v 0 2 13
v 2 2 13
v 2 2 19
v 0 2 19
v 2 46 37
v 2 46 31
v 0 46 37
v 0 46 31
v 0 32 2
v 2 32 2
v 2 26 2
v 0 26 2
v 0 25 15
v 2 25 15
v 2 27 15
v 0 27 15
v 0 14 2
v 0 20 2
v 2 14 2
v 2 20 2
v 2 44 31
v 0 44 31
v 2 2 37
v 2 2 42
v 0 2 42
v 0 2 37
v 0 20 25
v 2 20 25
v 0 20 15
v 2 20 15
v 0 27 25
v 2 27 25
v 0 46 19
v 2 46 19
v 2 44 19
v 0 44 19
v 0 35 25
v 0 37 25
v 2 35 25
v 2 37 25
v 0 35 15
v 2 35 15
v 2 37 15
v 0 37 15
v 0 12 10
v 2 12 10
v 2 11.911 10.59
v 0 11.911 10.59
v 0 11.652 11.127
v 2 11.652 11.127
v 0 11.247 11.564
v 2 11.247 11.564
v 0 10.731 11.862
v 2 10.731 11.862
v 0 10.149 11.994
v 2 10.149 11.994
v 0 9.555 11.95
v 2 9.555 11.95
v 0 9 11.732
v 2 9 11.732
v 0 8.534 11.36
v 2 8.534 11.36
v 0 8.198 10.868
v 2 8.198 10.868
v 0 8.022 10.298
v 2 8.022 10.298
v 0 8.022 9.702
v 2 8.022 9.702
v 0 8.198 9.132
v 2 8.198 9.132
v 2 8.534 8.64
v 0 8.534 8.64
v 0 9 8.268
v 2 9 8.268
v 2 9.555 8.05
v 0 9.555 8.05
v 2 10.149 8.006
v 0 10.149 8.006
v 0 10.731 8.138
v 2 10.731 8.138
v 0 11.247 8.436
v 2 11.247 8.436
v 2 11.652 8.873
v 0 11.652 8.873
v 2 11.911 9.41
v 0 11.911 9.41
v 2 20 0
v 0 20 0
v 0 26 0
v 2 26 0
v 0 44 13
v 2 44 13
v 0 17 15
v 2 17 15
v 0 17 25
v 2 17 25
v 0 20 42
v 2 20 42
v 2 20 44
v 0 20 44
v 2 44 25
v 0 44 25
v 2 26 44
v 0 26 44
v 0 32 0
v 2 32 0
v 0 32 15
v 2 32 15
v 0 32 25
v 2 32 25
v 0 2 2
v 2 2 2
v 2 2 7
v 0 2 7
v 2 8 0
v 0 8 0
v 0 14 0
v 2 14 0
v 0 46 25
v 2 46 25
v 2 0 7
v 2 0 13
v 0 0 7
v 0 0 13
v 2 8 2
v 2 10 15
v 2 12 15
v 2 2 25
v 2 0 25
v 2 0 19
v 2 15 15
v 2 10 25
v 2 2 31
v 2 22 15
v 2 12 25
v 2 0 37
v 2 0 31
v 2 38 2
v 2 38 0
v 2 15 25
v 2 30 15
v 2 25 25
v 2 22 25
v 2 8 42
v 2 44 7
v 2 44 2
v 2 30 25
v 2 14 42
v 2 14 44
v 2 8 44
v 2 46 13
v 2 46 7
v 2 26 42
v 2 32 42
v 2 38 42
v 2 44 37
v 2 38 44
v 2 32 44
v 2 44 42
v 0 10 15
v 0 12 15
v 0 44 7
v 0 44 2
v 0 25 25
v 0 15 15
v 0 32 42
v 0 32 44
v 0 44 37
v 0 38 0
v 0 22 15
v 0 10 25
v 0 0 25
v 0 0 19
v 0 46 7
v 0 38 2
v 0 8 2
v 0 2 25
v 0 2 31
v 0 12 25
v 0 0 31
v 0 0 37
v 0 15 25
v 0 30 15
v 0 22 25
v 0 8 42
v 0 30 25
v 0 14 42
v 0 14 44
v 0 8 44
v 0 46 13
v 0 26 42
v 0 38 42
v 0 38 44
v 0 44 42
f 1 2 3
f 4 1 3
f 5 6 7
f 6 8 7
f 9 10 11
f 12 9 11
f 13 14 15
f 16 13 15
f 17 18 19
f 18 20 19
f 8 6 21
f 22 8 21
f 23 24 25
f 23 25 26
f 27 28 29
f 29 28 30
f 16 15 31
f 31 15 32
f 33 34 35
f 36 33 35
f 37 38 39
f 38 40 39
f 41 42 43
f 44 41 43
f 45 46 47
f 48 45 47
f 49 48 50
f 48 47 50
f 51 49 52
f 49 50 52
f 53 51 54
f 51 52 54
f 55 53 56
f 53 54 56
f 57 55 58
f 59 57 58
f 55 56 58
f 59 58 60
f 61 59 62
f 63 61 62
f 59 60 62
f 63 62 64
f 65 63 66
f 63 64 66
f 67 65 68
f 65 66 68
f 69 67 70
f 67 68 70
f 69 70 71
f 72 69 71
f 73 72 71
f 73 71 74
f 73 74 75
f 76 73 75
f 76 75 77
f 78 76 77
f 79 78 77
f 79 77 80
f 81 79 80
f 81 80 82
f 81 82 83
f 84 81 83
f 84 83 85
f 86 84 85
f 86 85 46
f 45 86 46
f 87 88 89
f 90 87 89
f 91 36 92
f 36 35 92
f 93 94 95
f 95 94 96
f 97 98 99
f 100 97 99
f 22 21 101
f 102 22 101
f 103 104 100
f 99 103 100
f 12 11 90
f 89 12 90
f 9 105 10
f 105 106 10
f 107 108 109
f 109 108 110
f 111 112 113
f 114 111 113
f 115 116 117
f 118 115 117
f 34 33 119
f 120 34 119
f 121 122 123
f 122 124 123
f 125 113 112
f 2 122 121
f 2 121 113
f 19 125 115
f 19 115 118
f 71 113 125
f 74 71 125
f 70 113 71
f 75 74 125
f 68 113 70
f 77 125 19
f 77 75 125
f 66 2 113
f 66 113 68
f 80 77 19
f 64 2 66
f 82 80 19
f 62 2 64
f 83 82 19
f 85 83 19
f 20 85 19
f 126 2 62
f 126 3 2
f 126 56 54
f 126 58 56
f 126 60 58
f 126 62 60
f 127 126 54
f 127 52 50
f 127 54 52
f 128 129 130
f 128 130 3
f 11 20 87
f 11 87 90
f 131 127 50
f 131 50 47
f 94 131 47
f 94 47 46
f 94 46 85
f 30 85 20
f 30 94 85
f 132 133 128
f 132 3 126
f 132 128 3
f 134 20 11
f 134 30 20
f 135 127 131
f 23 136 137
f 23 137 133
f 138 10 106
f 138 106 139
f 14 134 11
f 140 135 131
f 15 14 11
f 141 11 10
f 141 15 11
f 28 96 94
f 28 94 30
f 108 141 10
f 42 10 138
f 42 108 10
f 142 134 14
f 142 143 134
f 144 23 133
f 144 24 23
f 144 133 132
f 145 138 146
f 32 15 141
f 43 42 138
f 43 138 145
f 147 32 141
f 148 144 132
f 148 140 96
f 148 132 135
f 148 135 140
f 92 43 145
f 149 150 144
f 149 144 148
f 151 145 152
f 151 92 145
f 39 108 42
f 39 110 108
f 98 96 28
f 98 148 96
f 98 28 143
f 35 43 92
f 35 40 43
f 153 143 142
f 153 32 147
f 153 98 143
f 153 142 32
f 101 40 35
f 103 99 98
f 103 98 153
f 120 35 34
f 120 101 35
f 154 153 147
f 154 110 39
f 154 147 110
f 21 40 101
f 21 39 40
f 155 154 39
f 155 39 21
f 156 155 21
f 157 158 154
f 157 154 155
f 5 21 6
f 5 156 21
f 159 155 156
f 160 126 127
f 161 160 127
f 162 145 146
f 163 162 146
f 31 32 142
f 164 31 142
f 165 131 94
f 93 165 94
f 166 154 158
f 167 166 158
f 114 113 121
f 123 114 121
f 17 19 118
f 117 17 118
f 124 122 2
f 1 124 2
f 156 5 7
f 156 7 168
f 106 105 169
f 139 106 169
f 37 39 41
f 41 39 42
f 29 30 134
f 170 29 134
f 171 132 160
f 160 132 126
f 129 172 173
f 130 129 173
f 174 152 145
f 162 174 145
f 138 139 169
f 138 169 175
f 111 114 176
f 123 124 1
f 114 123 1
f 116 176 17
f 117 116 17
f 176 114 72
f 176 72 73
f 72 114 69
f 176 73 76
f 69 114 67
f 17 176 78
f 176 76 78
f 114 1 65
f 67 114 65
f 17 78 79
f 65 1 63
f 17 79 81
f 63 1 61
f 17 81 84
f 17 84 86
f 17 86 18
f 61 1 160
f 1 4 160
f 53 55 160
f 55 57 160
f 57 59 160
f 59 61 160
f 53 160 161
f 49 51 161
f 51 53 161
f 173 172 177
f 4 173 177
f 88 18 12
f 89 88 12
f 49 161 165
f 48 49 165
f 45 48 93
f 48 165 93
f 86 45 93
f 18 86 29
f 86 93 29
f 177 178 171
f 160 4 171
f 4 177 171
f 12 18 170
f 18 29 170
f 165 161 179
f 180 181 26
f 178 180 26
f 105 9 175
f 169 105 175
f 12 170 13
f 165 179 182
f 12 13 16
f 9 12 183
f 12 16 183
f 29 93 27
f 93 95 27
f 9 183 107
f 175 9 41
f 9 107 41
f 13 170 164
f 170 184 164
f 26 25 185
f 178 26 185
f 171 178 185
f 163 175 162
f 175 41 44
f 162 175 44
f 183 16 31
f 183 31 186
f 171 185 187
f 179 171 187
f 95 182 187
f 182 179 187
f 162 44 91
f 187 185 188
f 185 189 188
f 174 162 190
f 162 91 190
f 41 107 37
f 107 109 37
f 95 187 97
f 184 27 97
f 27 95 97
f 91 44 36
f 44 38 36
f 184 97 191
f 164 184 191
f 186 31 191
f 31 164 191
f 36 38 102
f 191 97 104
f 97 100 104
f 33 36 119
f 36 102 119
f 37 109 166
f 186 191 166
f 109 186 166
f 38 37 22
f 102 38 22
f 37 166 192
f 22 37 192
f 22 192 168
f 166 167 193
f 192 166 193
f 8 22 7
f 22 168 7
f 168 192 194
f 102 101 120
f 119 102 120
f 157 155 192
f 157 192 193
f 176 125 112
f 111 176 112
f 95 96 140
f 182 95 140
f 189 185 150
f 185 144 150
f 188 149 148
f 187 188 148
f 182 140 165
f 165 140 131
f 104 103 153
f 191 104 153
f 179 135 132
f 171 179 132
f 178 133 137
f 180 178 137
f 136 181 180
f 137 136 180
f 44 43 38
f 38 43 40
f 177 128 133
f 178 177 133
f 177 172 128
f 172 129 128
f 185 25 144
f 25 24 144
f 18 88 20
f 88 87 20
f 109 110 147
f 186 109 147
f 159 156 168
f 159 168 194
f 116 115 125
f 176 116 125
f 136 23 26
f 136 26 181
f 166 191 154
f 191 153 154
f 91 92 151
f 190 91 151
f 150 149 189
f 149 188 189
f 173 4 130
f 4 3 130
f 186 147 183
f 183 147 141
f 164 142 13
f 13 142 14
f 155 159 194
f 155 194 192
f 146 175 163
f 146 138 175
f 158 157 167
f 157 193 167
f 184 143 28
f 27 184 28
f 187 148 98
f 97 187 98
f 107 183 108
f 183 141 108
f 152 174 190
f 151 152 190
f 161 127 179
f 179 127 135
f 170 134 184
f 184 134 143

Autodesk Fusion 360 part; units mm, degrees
sketch "スケッチ1" plane through (0, 0, 0) normal (1, 0, 0) x (0, 1, 0)
  line L0 (0, 0) -> (46, 0)
  line L1 (46, 0) -> (46, 44)
  line L2 (46, 44) -> (0, 44)
  line L3 (0, 44) -> (0, 0)
  dimension "d1" = 46
  dimension "d2" = 44
extrude "押し出し1" add sketch "スケッチ1" along normal blind 2
sketch "スケッチ2" plane through (2, 0, 0) normal (1, 0, 0) x (0, 1, 0)
  line L0 (0, 44) -> (0, 0)
  line L1 (0, 0) -> (46, 0)
  line L2 (46, 0) -> (46, 44)
  line L3 (46, 44) -> (0, 44)
  line L4 (0, 0) -> (8, 0)
  line L5 (8, 0) -> (8, 2)
  line L6 (8, 2) -> (0, 2)
  line L7 (0, 2) -> (0, 0)
  line L8 (14, 0) -> (20, 0)
  line L9 (20, 0) -> (20, 2)
  line L10 (20, 2) -> (14, 2)
  line L11 (14, 2) -> (14, 0)
  line L12 (26, 0) -> (32, 0)
  line L13 (32, 0) -> (32, 2)
  line L14 (32, 2) -> (26, 2)
  line L15 (26, 2) -> (26, 0)
  line L16 (46, 0) -> (38, 0)
  line L17 (38, 0) -> (38, 2)
  line L18 (38, 2) -> (46, 2)
  line L19 (46, 2) -> (46, 0)
  line L20 (32, 42) -> (32, 44)
  line L21 (32, 44) -> (26, 44)
  line L22 (20, 42) -> (20, 44)
  line L23 (38, 42) -> (38, 44)
  line L24 (38, 44) -> (46, 44)
  line L25 (46, 44) -> (46, 42)
  line L26 (0, 42) -> (8, 42)
  line L27 (26, 44) -> (26, 42)
  line L28 (8, 42) -> (8, 44)
  line L29 (8, 44) -> (0, 44)
  line L30 (0, 44) -> (0, 42)
  line L31 (20, 44) -> (14, 44)
  line L32 (26, 42) -> (32, 42)
  line L33 (46, 42) -> (38, 42)
  line L34 (14, 42) -> (20, 42)
  line L35 (14, 44) -> (14, 42)
  point P0 (0, 42)
  dimension "d5" = 8
  dimension "d6" = 2
  dimension "d7" = 6
  dimension "d8" = 2
  dimension "d9" = 6
  dimension "d10" = 6
  dimension "d11" = 2
  dimension "d12" = 6
  dimension "d13" = 6
  dimension "d14" = 2
extrude "押し出し2" cut sketch "スケッチ2" against normal blind 2 contours L0 L3 L26 L28 L29 L30 | L0 L1 L4 L5 L6 L7 | L3 L22 L31 L34 L35 | L3 L20 L21 L27 L32 | L1 L8 L9 L10 L11 | L2 L3 L23 L24 L25 L33 | L1 L12 L13 L14 L15 | L1 L2 L16 L17 L18 L19
sketch "スケッチ3" plane through (2, 0, 0) normal (1, 0, 0) x (0, 1, 0)
  line L0 (8, 2) -> (8, 0)
  line L1 (8, 0) -> (14, 0)
  line L2 (14, 0) -> (14, 2)
  line L3 (14, 2) -> (20, 2)
  line L4 (20, 2) -> (20, 0)
  line L5 (20, 0) -> (26, 0)
  line L6 (26, 0) -> (26, 2)
  line L7 (26, 2) -> (32, 2)
  line L8 (32, 2) -> (32, 0)
  line L9 (32, 0) -> (38, 0)
  line L10 (38, 0) -> (38, 2)
  line L11 (38, 2) -> (46, 2)
  line L12 (46, 2) -> (46, 42)
  line L13 (46, 42) -> (38, 42)
  line L14 (38, 42) -> (38, 44)
  line L15 (38, 44) -> (32, 44)
  line L16 (32, 44) -> (32, 42)
  line L17 (32, 42) -> (26, 42)
  line L18 (26, 42) -> (26, 44)
  line L19 (26, 44) -> (20, 44)
  line L20 (20, 44) -> (20, 42)
  line L21 (20, 42) -> (14, 42)
  line L22 (14, 42) -> (14, 44)
  line L23 (14, 44) -> (8, 44)
  line L24 (8, 44) -> (8, 42)
  line L25 (8, 42) -> (0, 42)
  line L26 (0, 42) -> (0, 2)
  line L27 (0, 2) -> (8, 2)
  line L28 (0, 44) -> (2, 44)
  line L29 (2, 44) -> (2, 37)
  line L30 (2, 37) -> (0, 37)
  line L31 (0, 37) -> (0, 44)
  line L32 (2, 31) -> (0, 31)
  line L33 (0, 31) -> (0, 25)
  line L34 (0, 25) -> (2, 25)
  line L35 (2, 25) -> (2, 31)
  line L36 (2, 19) -> (0, 19)
  line L37 (0, 19) -> (0, 13)
  line L38 (0, 13) -> (2, 13)
  line L39 (2, 13) -> (2, 19)
  line L40 (2, 7) -> (0, 7)
  line L41 (0, 7) -> (0, 0)
  line L42 (0, 0) -> (2, 0)
  line L43 (2, 0) -> (2, 7)
  line L44 (46, 31) -> (44, 31)
  line L45 (46, 13) -> (46, 19)
  line L46 (44, 44) -> (46, 44)
  line L47 (44, 0) -> (46, 0)
  line L48 (44, 7) -> (44, 0)
  line L49 (44, 25) -> (46, 25)
  line L50 (46, 37) -> (44, 37)
  line L51 (44, 37) -> (44, 44)
  line L52 (44, 13) -> (46, 13)
  line L53 (44, 31) -> (44, 25)
  line L54 (46, 19) -> (44, 19)
  line L55 (44, 19) -> (44, 13)
  line L56 (46, 25) -> (46, 31)
  line L57 (46, 7) -> (44, 7)
  line L58 (46, 0) -> (46, 7)
  line L59 (46, 44) -> (46, 37)
  point P0 (44, 0)
  dimension "d21" = 2
  dimension "d22" = 7
  dimension "d23" = 2
  dimension "d24" = 6
  dimension "d25" = 6
  dimension "d26" = 6
  dimension "d27" = 6
  dimension "d28" = 2
  dimension "d29" = 6
  dimension "d30" = 7
  dimension "d31" = 2
extrude "押し出し3" cut sketch "スケッチ3" against normal blind 2 contours L27 L41 L42 L43 | L26 L27 L40 L41 L43 | L26 L36 L37 L38 L39 | L26 L32 L33 L34 L35 | L25 L26 L29 L30 L31 | L25 L28 L29 L31 | L11 L12 L48 L57 L58 | L11 L47 L48 L58 | L12 L45 L52 L54 L55 | L12 L44 L49 L53 L56 | L12 L13 L50 L51 L59 | L13 L46 L51 L59
sketch "スケッチ4" plane through (2, 0, 0) normal (1, 0, 0) x (0, 1, 0)
  line L0 (44, 19) -> (46, 19)
  line L1 (46, 19) -> (46, 25)
  line L2 (46, 25) -> (44, 25)
  line L3 (44, 25) -> (44, 31)
  line L4 (44, 31) -> (46, 31)
  line L5 (46, 31) -> (46, 37)
  line L6 (46, 37) -> (44, 37)
  line L7 (44, 37) -> (44, 42)
  line L8 (44, 42) -> (38, 42)
  line L9 (38, 42) -> (38, 44)
  line L10 (38, 44) -> (32, 44)
  line L11 (32, 44) -> (32, 42)
  line L12 (32, 42) -> (26, 42)
  line L13 (26, 42) -> (26, 44)
  line L14 (26, 44) -> (20, 44)
  line L15 (20, 44) -> (20, 42)
  line L16 (20, 42) -> (14, 42)
  line L17 (14, 42) -> (14, 44)
  line L18 (14, 44) -> (8, 44)
  line L19 (8, 44) -> (8, 42)
  line L20 (8, 42) -> (2, 42)
  line L21 (2, 42) -> (2, 37)
  line L22 (2, 37) -> (0, 37)
  line L23 (0, 37) -> (0, 31)
  line L24 (0, 31) -> (2, 31)
  line L25 (2, 31) -> (2, 25)
  line L26 (2, 25) -> (0, 25)
  line L27 (0, 25) -> (0, 19)
  line L28 (0, 19) -> (2, 19)
  line L29 (2, 19) -> (2, 13)
  line L30 (2, 13) -> (0, 13)
  line L31 (0, 13) -> (0, 7)
  line L32 (0, 7) -> (2, 7)
  line L33 (2, 7) -> (2, 2)
  line L34 (2, 2) -> (8, 2)
  line L35 (8, 2) -> (8, 0)
  line L36 (8, 0) -> (14, 0)
  line L37 (14, 0) -> (14, 2)
  line L38 (14, 2) -> (20, 2)
  line L39 (20, 2) -> (20, 0)
  line L40 (20, 0) -> (26, 0)
  line L41 (26, 0) -> (26, 2)
  line L42 (26, 2) -> (32, 2)
  line L43 (32, 2) -> (32, 0)
  line L44 (32, 0) -> (38, 0)
  line L45 (38, 0) -> (38, 2)
  line L46 (38, 2) -> (44, 2)
  line L47 (44, 2) -> (44, 7)
  line L48 (44, 7) -> (46, 7)
  line L49 (46, 7) -> (46, 13)
  line L50 (46, 13) -> (44, 13)
  line L51 (44, 13) -> (44, 19)
  line L52 (10, 15) -> (12, 15)
  line L53 (12, 15) -> (12, 25)
  line L54 (12, 25) -> (10, 25)
  line L55 (10, 25) -> (10, 15)
  line L56 (15, 15) -> (17, 15)
  line L57 (17, 15) -> (17, 25)
  line L58 (17, 25) -> (15, 25)
  line L59 (15, 25) -> (15, 15)
  line L60 (20, 15) -> (22, 15)
  line L61 (22, 15) -> (22, 25)
  line L62 (22, 25) -> (20, 25)
  line L63 (20, 25) -> (20, 15)
  line L64 (25, 15) -> (27, 15)
  line L65 (27, 15) -> (27, 25)
  line L66 (27, 25) -> (25, 25)
  line L67 (25, 25) -> (25, 15)
  line L68 (30, 15) -> (32, 15)
  line L69 (32, 15) -> (32, 25)
  line L70 (32, 25) -> (30, 25)
  line L71 (30, 25) -> (30, 15)
  line L72 (35, 15) -> (37, 15)
  line L73 (37, 15) -> (37, 25)
  line L74 (37, 25) -> (35, 25)
  line L75 (35, 25) -> (35, 15)
extrude "押し出し4" cut sketch "スケッチ4" against normal blind 2 contours L52 L53 L54 L55 | L56 L57 L58 L59 | L60 L61 L62 L63 | L64 L65 L66 L67 | L68 L69 L70 L71 | L72 L73 L74 L75
sketch "スケッチ5" plane through (2, 0, 0) normal (1, 0, 0) x (0, 1, 0)
  line L0 (37, 15) -> (35, 15)
  line L1 (35, 15) -> (35, 25)
  line L2 (35, 25) -> (37, 25)
  line L3 (37, 25) -> (37, 15)
  line L4 (32, 15) -> (30, 15)
  line L5 (30, 15) -> (30, 25)
  line L6 (30, 25) -> (32, 25)
  line L7 (32, 25) -> (32, 15)
  line L8 (17, 15) -> (15, 15)
  line L9 (15, 15) -> (15, 25)
  line L10 (15, 25) -> (17, 25)
  line L11 (17, 25) -> (17, 15)
  line L12 (12, 15) -> (10, 15)
  line L13 (10, 15) -> (10, 25)
  line L14 (10, 25) -> (12, 25)
  line L15 (12, 25) -> (12, 15)
  line L16 (22, 15) -> (20, 15)
  line L17 (20, 15) -> (20, 25)
  line L18 (20, 25) -> (22, 25)
  line L19 (22, 25) -> (22, 15)
  line L20 (27, 15) -> (25, 15)
  line L21 (25, 15) -> (25, 25)
  line L22 (25, 25) -> (27, 25)
  line L23 (27, 25) -> (27, 15)
  line L24 (44, 19) -> (46, 19)
  line L25 (46, 19) -> (46, 25)
  line L26 (46, 25) -> (44, 25)
  line L27 (44, 25) -> (44, 31)
  line L28 (44, 31) -> (46, 31)
  line L29 (46, 31) -> (46, 37)
  line L30 (46, 37) -> (44, 37)
  line L31 (44, 37) -> (44, 42)
  line L32 (44, 42) -> (38, 42)
  line L33 (38, 42) -> (38, 44)
  line L34 (38, 44) -> (32, 44)
  line L35 (32, 44) -> (32, 42)
  line L36 (32, 42) -> (26, 42)
  line L37 (26, 42) -> (26, 44)
  line L38 (26, 44) -> (20, 44)
  line L39 (20, 44) -> (20, 42)
  line L40 (20, 42) -> (14, 42)
  line L41 (14, 42) -> (14, 44)
  line L42 (14, 44) -> (8, 44)
  line L43 (8, 44) -> (8, 42)
  line L44 (8, 42) -> (2, 42)
  line L45 (2, 42) -> (2, 37)
  line L46 (2, 37) -> (0, 37)
  line L47 (0, 37) -> (0, 31)
  line L48 (0, 31) -> (2, 31)
  line L49 (2, 31) -> (2, 25)
  line L50 (2, 25) -> (0, 25)
  line L51 (0, 25) -> (0, 19)
  line L52 (0, 19) -> (2, 19)
  line L53 (2, 19) -> (2, 13)
  line L54 (2, 13) -> (0, 13)
  line L55 (0, 13) -> (0, 7)
  line L56 (0, 7) -> (2, 7)
  line L57 (2, 7) -> (2, 2)
  line L58 (2, 2) -> (8, 2)
  line L59 (8, 2) -> (8, 0)
  line L60 (8, 0) -> (14, 0)
  line L61 (14, 0) -> (14, 2)
  line L62 (14, 2) -> (20, 2)
  line L63 (20, 2) -> (20, 0)
  line L64 (20, 0) -> (26, 0)
  line L65 (26, 0) -> (26, 2)
  line L66 (26, 2) -> (32, 2)
  line L67 (32, 2) -> (32, 0)
  line L68 (32, 0) -> (38, 0)
  line L69 (38, 0) -> (38, 2)
  line L70 (38, 2) -> (44, 2)
  line L71 (44, 2) -> (44, 7)
  line L72 (44, 7) -> (46, 7)
  line L73 (46, 7) -> (46, 13)
  line L74 (46, 13) -> (44, 13)
  line L75 (44, 13) -> (44, 19)
  circle A0 centre (10, 10) radius 2
extrude "押し出し5" cut sketch "スケッチ5" against normal blind 2 contours A0
sketch "スケッチ6" plane through (2, 0, 0) normal (1, 0, 0) x (0, 1, 0)
  circle A0 centre (10, 10) radius 2
  line L0 (37, 15) -> (35, 15)
  line L1 (35, 15) -> (35, 25)
  line L2 (35, 25) -> (37, 25)
  line L3 (37, 25) -> (37, 15)
  line L4 (32, 15) -> (30, 15)
  line L5 (30, 15) -> (30, 25)
  line L6 (30, 25) -> (32, 25)
  line L7 (32, 25) -> (32, 15)
  line L8 (17, 15) -> (15, 15)
  line L9 (15, 15) -> (15, 25)
  line L10 (15, 25) -> (17, 25)
  line L11 (17, 25) -> (17, 15)
  line L12 (12, 15) -> (10, 15)
  line L13 (10, 15) -> (10, 25)
  line L14 (10, 25) -> (12, 25)
  line L15 (12, 25) -> (12, 15)
  line L16 (22, 15) -> (20, 15)
  line L17 (20, 15) -> (20, 25)
  line L18 (20, 25) -> (22, 25)
  line L19 (22, 25) -> (22, 15)
  line L20 (27, 15) -> (25, 15)
  line L21 (25, 15) -> (25, 25)
  line L22 (25, 25) -> (27, 25)
  line L23 (27, 25) -> (27, 15)
  line L24 (44, 19) -> (46, 19)
  line L25 (46, 19) -> (46, 25)
  line L26 (46, 25) -> (44, 25)
  line L27 (44, 25) -> (44, 31)
  line L28 (44, 31) -> (46, 31)
  line L29 (46, 31) -> (46, 37)
  line L30 (46, 37) -> (44, 37)
  line L31 (44, 37) -> (44, 42)
  line L32 (44, 42) -> (38, 42)
  line L33 (38, 42) -> (38, 44)
  line L34 (38, 44) -> (32, 44)
  line L35 (32, 44) -> (32, 42)
  line L36 (32, 42) -> (26, 42)
  line L37 (26, 42) -> (26, 44)
  line L38 (26, 44) -> (20, 44)
  line L39 (20, 44) -> (20, 42)
  line L40 (20, 42) -> (14, 42)
  line L41 (14, 42) -> (14, 44)
  line L42 (14, 44) -> (8, 44)
  line L43 (8, 44) -> (8, 42)
  line L44 (8, 42) -> (2, 42)
  line L45 (2, 42) -> (2, 37)
  line L46 (2, 37) -> (0, 37)
  line L47 (0, 37) -> (0, 31)
  line L48 (0, 31) -> (2, 31)
  line L49 (2, 31) -> (2, 25)
  line L50 (2, 25) -> (0, 25)
  line L51 (0, 25) -> (0, 19)
  line L52 (0, 19) -> (2, 19)
  line L53 (2, 19) -> (2, 13)
  line L54 (2, 13) -> (0, 13)
  line L55 (0, 13) -> (0, 7)
  line L56 (0, 7) -> (2, 7)
  line L57 (2, 7) -> (2, 2)
  line L58 (2, 2) -> (8, 2)
  line L59 (8, 2) -> (8, 0)
  line L60 (8, 0) -> (14, 0)
  line L61 (14, 0) -> (14, 2)
  line L62 (14, 2) -> (20, 2)
  line L63 (20, 2) -> (20, 0)
  line L64 (20, 0) -> (26, 0)
  line L65 (26, 0) -> (26, 2)
  line L66 (26, 2) -> (32, 2)
  line L67 (32, 2) -> (32, 0)
  line L68 (32, 0) -> (38, 0)
  line L69 (38, 0) -> (38, 2)
  line L70 (38, 2) -> (44, 2)
  line L71 (44, 2) -> (44, 7)
  line L72 (44, 7) -> (46, 7)
  line L73 (46, 7) -> (46, 13)
  line L74 (46, 13) -> (44, 13)
  line L75 (44, 13) -> (44, 19)
